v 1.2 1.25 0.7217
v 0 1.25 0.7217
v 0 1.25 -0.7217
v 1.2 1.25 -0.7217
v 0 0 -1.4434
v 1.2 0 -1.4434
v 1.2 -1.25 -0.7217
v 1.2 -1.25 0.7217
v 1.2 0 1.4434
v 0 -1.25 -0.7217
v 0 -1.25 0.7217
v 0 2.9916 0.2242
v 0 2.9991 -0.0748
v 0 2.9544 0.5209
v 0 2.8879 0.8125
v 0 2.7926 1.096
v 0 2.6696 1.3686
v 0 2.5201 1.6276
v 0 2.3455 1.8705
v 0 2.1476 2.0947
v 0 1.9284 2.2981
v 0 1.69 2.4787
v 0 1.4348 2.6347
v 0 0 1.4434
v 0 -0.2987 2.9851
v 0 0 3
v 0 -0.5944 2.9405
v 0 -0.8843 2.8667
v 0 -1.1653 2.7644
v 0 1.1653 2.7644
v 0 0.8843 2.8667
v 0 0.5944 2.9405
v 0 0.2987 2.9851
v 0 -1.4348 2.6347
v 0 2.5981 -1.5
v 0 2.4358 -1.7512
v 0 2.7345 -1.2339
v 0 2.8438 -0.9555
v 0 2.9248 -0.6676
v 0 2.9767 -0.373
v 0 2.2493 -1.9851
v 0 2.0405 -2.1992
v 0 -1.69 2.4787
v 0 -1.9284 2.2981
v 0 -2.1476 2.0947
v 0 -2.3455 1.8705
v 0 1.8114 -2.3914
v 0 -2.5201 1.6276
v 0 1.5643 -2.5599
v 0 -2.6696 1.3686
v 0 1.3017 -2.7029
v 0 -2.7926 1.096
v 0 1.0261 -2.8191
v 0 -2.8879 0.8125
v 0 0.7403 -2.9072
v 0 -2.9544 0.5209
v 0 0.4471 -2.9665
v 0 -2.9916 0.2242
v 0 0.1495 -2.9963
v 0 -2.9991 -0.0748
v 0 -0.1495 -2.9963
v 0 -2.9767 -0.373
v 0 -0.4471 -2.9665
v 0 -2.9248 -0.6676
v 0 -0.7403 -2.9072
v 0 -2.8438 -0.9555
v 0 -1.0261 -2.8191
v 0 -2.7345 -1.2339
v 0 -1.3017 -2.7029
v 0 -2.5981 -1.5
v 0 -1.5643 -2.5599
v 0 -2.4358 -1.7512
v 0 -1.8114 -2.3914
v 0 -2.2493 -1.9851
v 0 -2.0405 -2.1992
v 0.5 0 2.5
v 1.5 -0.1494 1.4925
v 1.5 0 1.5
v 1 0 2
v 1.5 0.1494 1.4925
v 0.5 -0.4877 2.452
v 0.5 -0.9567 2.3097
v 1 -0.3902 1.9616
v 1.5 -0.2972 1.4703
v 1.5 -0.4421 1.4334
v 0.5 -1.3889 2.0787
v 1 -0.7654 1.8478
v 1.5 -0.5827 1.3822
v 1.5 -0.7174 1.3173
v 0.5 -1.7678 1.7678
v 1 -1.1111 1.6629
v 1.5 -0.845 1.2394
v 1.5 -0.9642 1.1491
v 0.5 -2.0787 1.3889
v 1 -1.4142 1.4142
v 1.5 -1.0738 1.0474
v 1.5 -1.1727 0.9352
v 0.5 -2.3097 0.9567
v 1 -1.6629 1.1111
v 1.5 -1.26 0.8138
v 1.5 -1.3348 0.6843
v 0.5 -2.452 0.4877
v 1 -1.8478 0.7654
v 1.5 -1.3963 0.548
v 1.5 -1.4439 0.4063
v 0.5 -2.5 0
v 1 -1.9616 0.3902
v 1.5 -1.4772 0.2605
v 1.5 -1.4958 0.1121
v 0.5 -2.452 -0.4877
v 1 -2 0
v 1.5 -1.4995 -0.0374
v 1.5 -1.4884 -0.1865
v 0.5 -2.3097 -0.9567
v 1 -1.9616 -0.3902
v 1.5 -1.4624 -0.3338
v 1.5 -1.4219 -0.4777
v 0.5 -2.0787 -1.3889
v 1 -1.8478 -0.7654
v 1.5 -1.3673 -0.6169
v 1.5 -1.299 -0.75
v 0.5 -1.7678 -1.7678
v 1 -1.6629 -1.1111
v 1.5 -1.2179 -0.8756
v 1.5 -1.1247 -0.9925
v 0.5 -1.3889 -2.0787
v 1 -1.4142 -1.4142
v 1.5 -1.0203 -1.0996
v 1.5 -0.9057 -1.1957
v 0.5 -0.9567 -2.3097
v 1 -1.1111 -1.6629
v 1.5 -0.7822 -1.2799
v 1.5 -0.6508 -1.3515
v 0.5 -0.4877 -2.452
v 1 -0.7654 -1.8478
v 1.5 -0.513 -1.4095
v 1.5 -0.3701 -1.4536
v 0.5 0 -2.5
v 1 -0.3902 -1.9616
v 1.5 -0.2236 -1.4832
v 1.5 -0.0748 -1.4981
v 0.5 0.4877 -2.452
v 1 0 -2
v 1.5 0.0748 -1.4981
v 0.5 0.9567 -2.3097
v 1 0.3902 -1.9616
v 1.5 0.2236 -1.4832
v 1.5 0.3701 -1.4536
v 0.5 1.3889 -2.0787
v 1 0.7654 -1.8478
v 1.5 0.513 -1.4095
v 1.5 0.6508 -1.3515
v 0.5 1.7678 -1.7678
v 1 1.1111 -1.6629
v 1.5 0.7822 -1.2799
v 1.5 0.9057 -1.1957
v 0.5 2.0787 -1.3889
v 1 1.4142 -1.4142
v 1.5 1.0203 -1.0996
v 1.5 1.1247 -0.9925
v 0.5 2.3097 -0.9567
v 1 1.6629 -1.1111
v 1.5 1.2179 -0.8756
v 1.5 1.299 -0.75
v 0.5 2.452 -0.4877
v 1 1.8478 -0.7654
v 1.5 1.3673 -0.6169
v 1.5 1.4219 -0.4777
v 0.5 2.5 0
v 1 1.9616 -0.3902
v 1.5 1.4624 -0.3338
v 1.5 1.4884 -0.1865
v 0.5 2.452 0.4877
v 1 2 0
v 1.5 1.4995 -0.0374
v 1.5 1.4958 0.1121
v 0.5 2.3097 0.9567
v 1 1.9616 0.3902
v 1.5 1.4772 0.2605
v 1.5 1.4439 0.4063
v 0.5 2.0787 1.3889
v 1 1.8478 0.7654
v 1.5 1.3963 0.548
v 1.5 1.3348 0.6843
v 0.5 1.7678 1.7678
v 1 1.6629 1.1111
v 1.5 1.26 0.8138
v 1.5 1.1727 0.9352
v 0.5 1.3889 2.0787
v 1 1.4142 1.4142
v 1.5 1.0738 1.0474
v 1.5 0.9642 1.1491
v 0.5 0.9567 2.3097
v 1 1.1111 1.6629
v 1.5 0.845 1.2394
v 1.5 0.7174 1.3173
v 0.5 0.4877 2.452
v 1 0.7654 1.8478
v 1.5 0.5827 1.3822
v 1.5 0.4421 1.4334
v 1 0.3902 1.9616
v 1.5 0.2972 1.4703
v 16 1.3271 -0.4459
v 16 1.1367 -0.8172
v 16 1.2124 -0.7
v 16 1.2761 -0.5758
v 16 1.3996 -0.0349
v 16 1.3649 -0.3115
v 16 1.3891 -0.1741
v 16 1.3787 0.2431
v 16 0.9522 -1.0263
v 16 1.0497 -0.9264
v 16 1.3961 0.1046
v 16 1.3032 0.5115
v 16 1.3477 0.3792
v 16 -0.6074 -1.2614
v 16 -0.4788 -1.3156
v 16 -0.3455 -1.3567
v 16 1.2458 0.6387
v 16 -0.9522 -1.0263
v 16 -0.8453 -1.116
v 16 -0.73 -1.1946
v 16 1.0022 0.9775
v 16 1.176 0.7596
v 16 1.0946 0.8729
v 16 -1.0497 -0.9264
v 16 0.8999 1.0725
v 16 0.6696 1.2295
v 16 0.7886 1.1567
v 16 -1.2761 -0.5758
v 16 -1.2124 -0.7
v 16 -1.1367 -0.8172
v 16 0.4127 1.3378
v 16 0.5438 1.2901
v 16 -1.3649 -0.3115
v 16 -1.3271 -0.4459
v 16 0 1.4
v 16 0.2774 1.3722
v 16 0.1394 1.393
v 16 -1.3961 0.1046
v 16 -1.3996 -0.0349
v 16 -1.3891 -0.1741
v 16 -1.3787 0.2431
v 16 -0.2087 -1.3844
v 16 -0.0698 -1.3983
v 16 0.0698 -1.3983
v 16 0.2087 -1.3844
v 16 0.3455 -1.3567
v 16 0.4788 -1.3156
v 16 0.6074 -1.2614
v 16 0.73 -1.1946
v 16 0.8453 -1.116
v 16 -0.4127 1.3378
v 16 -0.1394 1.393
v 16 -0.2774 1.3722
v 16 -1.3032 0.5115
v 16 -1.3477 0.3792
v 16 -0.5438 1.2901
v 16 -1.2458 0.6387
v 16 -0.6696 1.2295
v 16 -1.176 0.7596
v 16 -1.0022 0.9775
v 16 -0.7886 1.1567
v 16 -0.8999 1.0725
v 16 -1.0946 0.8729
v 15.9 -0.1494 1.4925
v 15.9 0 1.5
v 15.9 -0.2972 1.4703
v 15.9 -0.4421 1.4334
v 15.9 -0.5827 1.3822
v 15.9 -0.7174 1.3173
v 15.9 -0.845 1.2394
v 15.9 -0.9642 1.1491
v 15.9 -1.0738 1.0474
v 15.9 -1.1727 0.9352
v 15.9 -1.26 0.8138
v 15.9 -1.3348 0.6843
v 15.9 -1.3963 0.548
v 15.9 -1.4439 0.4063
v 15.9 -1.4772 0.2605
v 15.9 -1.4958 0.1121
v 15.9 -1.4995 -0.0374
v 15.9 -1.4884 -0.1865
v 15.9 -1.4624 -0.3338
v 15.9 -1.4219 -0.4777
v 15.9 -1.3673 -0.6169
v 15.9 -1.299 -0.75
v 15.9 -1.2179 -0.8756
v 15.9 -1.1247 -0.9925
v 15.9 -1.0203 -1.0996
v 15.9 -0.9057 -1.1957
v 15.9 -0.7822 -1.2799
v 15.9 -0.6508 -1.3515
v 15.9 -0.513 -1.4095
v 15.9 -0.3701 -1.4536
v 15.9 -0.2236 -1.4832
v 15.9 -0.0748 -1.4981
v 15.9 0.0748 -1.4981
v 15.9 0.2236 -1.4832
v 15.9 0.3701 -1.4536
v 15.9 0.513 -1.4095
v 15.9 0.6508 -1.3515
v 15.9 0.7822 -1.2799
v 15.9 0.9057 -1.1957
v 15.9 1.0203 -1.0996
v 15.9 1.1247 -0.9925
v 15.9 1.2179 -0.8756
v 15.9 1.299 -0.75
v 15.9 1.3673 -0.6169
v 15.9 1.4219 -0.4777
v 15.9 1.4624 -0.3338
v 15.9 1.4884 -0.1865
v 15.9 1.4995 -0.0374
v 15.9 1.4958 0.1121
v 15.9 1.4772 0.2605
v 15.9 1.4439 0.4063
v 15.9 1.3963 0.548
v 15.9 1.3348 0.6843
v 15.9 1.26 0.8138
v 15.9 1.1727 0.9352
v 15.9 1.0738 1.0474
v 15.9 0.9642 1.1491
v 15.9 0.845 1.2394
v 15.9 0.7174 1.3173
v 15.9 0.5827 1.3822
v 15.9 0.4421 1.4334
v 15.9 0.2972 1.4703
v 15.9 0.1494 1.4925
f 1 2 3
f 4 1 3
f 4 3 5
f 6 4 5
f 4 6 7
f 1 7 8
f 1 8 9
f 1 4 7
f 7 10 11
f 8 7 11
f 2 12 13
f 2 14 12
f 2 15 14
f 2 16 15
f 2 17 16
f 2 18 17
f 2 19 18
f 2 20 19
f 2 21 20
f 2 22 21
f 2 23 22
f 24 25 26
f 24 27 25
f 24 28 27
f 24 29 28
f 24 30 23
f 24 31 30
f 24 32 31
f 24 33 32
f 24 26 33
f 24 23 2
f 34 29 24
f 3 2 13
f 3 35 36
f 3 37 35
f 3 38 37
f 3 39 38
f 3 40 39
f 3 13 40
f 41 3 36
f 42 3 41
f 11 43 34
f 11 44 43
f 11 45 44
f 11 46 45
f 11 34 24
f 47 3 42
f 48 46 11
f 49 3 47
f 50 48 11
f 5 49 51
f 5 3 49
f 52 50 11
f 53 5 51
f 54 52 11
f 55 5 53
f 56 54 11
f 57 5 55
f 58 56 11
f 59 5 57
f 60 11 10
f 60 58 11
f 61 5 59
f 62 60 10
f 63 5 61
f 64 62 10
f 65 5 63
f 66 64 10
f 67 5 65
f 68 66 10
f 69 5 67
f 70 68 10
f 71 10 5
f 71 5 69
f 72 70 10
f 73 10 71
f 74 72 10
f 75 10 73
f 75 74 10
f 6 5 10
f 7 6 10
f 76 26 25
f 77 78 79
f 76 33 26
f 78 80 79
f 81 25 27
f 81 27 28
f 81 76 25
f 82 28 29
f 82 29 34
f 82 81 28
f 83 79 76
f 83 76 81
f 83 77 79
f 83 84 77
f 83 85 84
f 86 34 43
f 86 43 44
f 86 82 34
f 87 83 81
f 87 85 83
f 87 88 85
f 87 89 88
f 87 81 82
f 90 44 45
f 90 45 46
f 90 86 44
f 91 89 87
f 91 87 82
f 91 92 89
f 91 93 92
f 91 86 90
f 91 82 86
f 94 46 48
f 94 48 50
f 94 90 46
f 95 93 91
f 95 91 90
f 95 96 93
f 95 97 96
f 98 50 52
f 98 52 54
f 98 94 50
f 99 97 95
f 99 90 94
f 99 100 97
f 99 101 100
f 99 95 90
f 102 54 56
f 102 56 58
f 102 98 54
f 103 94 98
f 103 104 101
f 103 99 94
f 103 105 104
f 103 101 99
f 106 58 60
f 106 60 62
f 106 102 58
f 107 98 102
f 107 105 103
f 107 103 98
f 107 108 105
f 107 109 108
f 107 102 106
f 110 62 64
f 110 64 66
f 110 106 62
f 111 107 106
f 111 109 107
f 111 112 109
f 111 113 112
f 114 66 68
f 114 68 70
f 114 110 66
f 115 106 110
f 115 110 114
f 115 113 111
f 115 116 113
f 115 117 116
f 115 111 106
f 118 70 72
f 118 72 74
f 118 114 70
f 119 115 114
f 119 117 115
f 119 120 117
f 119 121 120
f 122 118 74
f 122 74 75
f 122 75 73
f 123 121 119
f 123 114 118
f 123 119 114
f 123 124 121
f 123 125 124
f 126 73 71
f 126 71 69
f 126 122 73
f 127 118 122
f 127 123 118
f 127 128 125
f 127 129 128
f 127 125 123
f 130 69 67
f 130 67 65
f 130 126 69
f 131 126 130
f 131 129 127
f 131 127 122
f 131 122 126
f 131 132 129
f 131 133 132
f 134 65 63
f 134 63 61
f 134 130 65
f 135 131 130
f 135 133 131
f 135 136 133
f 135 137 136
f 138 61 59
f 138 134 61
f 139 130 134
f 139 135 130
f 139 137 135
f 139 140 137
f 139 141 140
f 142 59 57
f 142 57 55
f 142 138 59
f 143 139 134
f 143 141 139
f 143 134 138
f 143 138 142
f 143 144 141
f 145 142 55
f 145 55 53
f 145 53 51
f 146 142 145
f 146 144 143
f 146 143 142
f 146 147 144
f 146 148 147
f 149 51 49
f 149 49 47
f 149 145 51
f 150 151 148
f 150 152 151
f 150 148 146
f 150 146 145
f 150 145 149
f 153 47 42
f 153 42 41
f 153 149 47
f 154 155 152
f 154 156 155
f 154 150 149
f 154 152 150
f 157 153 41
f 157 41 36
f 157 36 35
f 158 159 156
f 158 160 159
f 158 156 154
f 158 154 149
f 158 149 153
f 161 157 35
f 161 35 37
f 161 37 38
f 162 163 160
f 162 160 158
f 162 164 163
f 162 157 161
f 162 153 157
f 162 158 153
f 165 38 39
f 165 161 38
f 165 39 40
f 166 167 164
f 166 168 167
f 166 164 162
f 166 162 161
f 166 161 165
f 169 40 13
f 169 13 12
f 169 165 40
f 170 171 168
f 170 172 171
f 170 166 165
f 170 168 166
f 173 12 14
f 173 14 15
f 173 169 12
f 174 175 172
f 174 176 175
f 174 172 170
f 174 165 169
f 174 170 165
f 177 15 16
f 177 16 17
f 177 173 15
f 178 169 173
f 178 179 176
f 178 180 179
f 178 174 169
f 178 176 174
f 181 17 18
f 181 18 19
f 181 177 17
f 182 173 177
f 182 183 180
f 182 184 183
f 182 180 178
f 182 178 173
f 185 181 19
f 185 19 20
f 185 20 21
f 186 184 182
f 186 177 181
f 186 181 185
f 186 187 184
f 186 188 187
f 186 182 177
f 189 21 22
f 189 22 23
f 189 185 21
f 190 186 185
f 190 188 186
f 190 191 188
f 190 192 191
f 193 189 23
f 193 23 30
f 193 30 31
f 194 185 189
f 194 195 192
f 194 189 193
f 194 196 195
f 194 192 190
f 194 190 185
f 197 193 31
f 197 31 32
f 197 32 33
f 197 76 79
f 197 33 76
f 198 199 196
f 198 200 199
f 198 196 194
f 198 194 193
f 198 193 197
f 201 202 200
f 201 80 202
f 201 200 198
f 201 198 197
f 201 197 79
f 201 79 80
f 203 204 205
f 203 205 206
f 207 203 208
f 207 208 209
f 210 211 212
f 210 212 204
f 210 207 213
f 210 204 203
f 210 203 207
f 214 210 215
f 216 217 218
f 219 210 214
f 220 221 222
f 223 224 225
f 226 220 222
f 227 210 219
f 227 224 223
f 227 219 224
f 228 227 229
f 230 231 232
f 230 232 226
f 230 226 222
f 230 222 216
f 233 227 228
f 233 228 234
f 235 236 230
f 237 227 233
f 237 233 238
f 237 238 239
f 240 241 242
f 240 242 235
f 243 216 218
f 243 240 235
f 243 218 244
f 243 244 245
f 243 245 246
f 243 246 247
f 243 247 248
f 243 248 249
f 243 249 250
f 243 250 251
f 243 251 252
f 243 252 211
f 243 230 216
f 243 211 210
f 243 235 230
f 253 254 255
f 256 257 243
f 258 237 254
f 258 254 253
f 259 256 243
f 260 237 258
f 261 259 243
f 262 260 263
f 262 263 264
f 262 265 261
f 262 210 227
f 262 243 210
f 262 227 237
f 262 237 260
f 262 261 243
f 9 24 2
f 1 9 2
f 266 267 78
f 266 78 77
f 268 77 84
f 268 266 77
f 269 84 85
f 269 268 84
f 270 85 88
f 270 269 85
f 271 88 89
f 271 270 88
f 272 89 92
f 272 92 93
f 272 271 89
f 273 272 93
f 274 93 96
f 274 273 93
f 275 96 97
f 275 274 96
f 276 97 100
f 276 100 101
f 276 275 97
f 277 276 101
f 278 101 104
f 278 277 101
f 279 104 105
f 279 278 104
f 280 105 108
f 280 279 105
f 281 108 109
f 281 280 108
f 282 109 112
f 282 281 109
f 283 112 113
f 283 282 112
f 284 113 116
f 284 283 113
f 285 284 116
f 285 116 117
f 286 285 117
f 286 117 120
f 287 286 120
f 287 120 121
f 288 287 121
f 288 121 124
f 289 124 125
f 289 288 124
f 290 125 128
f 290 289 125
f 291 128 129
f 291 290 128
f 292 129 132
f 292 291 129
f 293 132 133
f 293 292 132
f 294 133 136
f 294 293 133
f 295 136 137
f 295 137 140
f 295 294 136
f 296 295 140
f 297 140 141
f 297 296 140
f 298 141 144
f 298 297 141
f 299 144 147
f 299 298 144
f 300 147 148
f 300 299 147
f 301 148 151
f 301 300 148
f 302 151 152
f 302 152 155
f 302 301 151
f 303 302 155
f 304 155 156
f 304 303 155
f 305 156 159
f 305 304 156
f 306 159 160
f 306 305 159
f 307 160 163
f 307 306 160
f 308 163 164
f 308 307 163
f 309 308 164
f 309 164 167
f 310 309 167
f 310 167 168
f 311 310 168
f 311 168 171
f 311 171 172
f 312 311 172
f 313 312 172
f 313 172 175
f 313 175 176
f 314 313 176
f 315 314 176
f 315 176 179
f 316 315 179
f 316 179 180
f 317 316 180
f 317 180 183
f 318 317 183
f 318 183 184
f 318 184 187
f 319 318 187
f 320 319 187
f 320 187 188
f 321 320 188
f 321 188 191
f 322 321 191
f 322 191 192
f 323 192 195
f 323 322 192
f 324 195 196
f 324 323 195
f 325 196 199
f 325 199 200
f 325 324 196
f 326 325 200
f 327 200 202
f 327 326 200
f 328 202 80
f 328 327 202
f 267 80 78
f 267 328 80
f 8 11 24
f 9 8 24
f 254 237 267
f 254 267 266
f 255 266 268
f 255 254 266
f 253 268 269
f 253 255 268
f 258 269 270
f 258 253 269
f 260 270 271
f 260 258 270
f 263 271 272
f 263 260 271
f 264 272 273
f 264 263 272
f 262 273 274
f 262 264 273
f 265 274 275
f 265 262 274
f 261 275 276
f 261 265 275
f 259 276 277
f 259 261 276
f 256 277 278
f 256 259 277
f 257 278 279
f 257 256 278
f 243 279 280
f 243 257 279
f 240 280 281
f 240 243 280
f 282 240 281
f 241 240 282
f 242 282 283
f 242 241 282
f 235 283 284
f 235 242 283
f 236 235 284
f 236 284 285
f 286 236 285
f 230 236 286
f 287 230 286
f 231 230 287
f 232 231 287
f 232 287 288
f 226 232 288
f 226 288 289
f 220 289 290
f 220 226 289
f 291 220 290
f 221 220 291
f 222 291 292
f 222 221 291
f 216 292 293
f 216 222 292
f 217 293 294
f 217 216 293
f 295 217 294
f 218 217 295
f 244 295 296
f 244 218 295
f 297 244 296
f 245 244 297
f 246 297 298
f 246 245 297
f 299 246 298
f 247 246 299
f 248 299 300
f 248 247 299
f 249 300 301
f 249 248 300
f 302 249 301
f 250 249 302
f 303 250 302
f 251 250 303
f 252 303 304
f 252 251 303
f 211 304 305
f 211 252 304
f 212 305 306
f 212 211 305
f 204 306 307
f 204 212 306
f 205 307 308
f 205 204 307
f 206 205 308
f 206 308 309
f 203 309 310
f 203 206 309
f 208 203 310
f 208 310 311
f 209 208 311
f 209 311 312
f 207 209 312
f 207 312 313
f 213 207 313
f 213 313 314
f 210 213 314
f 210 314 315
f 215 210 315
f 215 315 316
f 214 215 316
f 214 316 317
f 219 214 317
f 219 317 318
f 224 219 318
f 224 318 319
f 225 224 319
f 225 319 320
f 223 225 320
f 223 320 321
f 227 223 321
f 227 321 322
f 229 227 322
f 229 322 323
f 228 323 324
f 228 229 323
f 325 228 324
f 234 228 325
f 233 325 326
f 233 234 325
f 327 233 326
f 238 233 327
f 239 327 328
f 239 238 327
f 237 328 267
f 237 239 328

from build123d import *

# Parameters (mm, degrees)
CUT_EXTRUDE_541_DEPTH = 1.2
CHAMFER_598_SIZE      = 0.1


with BuildPart() as part:
    # 草图1 → Revolve 358 (revolve)
    with BuildSketch(Plane(origin=(0, 0, 0), x_dir=(1, 0, 0), z_dir=(0, 1, 0)), mode=Mode.PRIVATE) as revolve_358_sk:
        Polygon((0, 0), (0, 3), (1.5, 1.5), (16, 1.5), (16, 0), align=None)
    revolve(revolve_358_sk.sketch.rotate(Axis((0, 0, 0), (1, 0, 0)), 180), axis=Axis((0, 0, 0), (1, 0, 0)))

    # 草图2 → Cut-Extrude 541 (cut)
    with BuildSketch(Plane.ZY):
        Polygon((1.443375673, 0), (0.721687836, 1.25), (-0.721687836, 1.25), (-1.443375673, 0), (-0.721687836, -1.25), (0.721687836, -1.25), align=None)
    extrude(amount=-CUT_EXTRUDE_541_DEPTH, mode=Mode.SUBTRACT)

    # Chamfer 598
    chamfer_598_edges = [part.edges().sort_by_distance(p)[0] for p in [
        (16, 0, -1.5),
    ]]
    chamfer(chamfer_598_edges, length=CHAMFER_598_SIZE)


solid = part.part
